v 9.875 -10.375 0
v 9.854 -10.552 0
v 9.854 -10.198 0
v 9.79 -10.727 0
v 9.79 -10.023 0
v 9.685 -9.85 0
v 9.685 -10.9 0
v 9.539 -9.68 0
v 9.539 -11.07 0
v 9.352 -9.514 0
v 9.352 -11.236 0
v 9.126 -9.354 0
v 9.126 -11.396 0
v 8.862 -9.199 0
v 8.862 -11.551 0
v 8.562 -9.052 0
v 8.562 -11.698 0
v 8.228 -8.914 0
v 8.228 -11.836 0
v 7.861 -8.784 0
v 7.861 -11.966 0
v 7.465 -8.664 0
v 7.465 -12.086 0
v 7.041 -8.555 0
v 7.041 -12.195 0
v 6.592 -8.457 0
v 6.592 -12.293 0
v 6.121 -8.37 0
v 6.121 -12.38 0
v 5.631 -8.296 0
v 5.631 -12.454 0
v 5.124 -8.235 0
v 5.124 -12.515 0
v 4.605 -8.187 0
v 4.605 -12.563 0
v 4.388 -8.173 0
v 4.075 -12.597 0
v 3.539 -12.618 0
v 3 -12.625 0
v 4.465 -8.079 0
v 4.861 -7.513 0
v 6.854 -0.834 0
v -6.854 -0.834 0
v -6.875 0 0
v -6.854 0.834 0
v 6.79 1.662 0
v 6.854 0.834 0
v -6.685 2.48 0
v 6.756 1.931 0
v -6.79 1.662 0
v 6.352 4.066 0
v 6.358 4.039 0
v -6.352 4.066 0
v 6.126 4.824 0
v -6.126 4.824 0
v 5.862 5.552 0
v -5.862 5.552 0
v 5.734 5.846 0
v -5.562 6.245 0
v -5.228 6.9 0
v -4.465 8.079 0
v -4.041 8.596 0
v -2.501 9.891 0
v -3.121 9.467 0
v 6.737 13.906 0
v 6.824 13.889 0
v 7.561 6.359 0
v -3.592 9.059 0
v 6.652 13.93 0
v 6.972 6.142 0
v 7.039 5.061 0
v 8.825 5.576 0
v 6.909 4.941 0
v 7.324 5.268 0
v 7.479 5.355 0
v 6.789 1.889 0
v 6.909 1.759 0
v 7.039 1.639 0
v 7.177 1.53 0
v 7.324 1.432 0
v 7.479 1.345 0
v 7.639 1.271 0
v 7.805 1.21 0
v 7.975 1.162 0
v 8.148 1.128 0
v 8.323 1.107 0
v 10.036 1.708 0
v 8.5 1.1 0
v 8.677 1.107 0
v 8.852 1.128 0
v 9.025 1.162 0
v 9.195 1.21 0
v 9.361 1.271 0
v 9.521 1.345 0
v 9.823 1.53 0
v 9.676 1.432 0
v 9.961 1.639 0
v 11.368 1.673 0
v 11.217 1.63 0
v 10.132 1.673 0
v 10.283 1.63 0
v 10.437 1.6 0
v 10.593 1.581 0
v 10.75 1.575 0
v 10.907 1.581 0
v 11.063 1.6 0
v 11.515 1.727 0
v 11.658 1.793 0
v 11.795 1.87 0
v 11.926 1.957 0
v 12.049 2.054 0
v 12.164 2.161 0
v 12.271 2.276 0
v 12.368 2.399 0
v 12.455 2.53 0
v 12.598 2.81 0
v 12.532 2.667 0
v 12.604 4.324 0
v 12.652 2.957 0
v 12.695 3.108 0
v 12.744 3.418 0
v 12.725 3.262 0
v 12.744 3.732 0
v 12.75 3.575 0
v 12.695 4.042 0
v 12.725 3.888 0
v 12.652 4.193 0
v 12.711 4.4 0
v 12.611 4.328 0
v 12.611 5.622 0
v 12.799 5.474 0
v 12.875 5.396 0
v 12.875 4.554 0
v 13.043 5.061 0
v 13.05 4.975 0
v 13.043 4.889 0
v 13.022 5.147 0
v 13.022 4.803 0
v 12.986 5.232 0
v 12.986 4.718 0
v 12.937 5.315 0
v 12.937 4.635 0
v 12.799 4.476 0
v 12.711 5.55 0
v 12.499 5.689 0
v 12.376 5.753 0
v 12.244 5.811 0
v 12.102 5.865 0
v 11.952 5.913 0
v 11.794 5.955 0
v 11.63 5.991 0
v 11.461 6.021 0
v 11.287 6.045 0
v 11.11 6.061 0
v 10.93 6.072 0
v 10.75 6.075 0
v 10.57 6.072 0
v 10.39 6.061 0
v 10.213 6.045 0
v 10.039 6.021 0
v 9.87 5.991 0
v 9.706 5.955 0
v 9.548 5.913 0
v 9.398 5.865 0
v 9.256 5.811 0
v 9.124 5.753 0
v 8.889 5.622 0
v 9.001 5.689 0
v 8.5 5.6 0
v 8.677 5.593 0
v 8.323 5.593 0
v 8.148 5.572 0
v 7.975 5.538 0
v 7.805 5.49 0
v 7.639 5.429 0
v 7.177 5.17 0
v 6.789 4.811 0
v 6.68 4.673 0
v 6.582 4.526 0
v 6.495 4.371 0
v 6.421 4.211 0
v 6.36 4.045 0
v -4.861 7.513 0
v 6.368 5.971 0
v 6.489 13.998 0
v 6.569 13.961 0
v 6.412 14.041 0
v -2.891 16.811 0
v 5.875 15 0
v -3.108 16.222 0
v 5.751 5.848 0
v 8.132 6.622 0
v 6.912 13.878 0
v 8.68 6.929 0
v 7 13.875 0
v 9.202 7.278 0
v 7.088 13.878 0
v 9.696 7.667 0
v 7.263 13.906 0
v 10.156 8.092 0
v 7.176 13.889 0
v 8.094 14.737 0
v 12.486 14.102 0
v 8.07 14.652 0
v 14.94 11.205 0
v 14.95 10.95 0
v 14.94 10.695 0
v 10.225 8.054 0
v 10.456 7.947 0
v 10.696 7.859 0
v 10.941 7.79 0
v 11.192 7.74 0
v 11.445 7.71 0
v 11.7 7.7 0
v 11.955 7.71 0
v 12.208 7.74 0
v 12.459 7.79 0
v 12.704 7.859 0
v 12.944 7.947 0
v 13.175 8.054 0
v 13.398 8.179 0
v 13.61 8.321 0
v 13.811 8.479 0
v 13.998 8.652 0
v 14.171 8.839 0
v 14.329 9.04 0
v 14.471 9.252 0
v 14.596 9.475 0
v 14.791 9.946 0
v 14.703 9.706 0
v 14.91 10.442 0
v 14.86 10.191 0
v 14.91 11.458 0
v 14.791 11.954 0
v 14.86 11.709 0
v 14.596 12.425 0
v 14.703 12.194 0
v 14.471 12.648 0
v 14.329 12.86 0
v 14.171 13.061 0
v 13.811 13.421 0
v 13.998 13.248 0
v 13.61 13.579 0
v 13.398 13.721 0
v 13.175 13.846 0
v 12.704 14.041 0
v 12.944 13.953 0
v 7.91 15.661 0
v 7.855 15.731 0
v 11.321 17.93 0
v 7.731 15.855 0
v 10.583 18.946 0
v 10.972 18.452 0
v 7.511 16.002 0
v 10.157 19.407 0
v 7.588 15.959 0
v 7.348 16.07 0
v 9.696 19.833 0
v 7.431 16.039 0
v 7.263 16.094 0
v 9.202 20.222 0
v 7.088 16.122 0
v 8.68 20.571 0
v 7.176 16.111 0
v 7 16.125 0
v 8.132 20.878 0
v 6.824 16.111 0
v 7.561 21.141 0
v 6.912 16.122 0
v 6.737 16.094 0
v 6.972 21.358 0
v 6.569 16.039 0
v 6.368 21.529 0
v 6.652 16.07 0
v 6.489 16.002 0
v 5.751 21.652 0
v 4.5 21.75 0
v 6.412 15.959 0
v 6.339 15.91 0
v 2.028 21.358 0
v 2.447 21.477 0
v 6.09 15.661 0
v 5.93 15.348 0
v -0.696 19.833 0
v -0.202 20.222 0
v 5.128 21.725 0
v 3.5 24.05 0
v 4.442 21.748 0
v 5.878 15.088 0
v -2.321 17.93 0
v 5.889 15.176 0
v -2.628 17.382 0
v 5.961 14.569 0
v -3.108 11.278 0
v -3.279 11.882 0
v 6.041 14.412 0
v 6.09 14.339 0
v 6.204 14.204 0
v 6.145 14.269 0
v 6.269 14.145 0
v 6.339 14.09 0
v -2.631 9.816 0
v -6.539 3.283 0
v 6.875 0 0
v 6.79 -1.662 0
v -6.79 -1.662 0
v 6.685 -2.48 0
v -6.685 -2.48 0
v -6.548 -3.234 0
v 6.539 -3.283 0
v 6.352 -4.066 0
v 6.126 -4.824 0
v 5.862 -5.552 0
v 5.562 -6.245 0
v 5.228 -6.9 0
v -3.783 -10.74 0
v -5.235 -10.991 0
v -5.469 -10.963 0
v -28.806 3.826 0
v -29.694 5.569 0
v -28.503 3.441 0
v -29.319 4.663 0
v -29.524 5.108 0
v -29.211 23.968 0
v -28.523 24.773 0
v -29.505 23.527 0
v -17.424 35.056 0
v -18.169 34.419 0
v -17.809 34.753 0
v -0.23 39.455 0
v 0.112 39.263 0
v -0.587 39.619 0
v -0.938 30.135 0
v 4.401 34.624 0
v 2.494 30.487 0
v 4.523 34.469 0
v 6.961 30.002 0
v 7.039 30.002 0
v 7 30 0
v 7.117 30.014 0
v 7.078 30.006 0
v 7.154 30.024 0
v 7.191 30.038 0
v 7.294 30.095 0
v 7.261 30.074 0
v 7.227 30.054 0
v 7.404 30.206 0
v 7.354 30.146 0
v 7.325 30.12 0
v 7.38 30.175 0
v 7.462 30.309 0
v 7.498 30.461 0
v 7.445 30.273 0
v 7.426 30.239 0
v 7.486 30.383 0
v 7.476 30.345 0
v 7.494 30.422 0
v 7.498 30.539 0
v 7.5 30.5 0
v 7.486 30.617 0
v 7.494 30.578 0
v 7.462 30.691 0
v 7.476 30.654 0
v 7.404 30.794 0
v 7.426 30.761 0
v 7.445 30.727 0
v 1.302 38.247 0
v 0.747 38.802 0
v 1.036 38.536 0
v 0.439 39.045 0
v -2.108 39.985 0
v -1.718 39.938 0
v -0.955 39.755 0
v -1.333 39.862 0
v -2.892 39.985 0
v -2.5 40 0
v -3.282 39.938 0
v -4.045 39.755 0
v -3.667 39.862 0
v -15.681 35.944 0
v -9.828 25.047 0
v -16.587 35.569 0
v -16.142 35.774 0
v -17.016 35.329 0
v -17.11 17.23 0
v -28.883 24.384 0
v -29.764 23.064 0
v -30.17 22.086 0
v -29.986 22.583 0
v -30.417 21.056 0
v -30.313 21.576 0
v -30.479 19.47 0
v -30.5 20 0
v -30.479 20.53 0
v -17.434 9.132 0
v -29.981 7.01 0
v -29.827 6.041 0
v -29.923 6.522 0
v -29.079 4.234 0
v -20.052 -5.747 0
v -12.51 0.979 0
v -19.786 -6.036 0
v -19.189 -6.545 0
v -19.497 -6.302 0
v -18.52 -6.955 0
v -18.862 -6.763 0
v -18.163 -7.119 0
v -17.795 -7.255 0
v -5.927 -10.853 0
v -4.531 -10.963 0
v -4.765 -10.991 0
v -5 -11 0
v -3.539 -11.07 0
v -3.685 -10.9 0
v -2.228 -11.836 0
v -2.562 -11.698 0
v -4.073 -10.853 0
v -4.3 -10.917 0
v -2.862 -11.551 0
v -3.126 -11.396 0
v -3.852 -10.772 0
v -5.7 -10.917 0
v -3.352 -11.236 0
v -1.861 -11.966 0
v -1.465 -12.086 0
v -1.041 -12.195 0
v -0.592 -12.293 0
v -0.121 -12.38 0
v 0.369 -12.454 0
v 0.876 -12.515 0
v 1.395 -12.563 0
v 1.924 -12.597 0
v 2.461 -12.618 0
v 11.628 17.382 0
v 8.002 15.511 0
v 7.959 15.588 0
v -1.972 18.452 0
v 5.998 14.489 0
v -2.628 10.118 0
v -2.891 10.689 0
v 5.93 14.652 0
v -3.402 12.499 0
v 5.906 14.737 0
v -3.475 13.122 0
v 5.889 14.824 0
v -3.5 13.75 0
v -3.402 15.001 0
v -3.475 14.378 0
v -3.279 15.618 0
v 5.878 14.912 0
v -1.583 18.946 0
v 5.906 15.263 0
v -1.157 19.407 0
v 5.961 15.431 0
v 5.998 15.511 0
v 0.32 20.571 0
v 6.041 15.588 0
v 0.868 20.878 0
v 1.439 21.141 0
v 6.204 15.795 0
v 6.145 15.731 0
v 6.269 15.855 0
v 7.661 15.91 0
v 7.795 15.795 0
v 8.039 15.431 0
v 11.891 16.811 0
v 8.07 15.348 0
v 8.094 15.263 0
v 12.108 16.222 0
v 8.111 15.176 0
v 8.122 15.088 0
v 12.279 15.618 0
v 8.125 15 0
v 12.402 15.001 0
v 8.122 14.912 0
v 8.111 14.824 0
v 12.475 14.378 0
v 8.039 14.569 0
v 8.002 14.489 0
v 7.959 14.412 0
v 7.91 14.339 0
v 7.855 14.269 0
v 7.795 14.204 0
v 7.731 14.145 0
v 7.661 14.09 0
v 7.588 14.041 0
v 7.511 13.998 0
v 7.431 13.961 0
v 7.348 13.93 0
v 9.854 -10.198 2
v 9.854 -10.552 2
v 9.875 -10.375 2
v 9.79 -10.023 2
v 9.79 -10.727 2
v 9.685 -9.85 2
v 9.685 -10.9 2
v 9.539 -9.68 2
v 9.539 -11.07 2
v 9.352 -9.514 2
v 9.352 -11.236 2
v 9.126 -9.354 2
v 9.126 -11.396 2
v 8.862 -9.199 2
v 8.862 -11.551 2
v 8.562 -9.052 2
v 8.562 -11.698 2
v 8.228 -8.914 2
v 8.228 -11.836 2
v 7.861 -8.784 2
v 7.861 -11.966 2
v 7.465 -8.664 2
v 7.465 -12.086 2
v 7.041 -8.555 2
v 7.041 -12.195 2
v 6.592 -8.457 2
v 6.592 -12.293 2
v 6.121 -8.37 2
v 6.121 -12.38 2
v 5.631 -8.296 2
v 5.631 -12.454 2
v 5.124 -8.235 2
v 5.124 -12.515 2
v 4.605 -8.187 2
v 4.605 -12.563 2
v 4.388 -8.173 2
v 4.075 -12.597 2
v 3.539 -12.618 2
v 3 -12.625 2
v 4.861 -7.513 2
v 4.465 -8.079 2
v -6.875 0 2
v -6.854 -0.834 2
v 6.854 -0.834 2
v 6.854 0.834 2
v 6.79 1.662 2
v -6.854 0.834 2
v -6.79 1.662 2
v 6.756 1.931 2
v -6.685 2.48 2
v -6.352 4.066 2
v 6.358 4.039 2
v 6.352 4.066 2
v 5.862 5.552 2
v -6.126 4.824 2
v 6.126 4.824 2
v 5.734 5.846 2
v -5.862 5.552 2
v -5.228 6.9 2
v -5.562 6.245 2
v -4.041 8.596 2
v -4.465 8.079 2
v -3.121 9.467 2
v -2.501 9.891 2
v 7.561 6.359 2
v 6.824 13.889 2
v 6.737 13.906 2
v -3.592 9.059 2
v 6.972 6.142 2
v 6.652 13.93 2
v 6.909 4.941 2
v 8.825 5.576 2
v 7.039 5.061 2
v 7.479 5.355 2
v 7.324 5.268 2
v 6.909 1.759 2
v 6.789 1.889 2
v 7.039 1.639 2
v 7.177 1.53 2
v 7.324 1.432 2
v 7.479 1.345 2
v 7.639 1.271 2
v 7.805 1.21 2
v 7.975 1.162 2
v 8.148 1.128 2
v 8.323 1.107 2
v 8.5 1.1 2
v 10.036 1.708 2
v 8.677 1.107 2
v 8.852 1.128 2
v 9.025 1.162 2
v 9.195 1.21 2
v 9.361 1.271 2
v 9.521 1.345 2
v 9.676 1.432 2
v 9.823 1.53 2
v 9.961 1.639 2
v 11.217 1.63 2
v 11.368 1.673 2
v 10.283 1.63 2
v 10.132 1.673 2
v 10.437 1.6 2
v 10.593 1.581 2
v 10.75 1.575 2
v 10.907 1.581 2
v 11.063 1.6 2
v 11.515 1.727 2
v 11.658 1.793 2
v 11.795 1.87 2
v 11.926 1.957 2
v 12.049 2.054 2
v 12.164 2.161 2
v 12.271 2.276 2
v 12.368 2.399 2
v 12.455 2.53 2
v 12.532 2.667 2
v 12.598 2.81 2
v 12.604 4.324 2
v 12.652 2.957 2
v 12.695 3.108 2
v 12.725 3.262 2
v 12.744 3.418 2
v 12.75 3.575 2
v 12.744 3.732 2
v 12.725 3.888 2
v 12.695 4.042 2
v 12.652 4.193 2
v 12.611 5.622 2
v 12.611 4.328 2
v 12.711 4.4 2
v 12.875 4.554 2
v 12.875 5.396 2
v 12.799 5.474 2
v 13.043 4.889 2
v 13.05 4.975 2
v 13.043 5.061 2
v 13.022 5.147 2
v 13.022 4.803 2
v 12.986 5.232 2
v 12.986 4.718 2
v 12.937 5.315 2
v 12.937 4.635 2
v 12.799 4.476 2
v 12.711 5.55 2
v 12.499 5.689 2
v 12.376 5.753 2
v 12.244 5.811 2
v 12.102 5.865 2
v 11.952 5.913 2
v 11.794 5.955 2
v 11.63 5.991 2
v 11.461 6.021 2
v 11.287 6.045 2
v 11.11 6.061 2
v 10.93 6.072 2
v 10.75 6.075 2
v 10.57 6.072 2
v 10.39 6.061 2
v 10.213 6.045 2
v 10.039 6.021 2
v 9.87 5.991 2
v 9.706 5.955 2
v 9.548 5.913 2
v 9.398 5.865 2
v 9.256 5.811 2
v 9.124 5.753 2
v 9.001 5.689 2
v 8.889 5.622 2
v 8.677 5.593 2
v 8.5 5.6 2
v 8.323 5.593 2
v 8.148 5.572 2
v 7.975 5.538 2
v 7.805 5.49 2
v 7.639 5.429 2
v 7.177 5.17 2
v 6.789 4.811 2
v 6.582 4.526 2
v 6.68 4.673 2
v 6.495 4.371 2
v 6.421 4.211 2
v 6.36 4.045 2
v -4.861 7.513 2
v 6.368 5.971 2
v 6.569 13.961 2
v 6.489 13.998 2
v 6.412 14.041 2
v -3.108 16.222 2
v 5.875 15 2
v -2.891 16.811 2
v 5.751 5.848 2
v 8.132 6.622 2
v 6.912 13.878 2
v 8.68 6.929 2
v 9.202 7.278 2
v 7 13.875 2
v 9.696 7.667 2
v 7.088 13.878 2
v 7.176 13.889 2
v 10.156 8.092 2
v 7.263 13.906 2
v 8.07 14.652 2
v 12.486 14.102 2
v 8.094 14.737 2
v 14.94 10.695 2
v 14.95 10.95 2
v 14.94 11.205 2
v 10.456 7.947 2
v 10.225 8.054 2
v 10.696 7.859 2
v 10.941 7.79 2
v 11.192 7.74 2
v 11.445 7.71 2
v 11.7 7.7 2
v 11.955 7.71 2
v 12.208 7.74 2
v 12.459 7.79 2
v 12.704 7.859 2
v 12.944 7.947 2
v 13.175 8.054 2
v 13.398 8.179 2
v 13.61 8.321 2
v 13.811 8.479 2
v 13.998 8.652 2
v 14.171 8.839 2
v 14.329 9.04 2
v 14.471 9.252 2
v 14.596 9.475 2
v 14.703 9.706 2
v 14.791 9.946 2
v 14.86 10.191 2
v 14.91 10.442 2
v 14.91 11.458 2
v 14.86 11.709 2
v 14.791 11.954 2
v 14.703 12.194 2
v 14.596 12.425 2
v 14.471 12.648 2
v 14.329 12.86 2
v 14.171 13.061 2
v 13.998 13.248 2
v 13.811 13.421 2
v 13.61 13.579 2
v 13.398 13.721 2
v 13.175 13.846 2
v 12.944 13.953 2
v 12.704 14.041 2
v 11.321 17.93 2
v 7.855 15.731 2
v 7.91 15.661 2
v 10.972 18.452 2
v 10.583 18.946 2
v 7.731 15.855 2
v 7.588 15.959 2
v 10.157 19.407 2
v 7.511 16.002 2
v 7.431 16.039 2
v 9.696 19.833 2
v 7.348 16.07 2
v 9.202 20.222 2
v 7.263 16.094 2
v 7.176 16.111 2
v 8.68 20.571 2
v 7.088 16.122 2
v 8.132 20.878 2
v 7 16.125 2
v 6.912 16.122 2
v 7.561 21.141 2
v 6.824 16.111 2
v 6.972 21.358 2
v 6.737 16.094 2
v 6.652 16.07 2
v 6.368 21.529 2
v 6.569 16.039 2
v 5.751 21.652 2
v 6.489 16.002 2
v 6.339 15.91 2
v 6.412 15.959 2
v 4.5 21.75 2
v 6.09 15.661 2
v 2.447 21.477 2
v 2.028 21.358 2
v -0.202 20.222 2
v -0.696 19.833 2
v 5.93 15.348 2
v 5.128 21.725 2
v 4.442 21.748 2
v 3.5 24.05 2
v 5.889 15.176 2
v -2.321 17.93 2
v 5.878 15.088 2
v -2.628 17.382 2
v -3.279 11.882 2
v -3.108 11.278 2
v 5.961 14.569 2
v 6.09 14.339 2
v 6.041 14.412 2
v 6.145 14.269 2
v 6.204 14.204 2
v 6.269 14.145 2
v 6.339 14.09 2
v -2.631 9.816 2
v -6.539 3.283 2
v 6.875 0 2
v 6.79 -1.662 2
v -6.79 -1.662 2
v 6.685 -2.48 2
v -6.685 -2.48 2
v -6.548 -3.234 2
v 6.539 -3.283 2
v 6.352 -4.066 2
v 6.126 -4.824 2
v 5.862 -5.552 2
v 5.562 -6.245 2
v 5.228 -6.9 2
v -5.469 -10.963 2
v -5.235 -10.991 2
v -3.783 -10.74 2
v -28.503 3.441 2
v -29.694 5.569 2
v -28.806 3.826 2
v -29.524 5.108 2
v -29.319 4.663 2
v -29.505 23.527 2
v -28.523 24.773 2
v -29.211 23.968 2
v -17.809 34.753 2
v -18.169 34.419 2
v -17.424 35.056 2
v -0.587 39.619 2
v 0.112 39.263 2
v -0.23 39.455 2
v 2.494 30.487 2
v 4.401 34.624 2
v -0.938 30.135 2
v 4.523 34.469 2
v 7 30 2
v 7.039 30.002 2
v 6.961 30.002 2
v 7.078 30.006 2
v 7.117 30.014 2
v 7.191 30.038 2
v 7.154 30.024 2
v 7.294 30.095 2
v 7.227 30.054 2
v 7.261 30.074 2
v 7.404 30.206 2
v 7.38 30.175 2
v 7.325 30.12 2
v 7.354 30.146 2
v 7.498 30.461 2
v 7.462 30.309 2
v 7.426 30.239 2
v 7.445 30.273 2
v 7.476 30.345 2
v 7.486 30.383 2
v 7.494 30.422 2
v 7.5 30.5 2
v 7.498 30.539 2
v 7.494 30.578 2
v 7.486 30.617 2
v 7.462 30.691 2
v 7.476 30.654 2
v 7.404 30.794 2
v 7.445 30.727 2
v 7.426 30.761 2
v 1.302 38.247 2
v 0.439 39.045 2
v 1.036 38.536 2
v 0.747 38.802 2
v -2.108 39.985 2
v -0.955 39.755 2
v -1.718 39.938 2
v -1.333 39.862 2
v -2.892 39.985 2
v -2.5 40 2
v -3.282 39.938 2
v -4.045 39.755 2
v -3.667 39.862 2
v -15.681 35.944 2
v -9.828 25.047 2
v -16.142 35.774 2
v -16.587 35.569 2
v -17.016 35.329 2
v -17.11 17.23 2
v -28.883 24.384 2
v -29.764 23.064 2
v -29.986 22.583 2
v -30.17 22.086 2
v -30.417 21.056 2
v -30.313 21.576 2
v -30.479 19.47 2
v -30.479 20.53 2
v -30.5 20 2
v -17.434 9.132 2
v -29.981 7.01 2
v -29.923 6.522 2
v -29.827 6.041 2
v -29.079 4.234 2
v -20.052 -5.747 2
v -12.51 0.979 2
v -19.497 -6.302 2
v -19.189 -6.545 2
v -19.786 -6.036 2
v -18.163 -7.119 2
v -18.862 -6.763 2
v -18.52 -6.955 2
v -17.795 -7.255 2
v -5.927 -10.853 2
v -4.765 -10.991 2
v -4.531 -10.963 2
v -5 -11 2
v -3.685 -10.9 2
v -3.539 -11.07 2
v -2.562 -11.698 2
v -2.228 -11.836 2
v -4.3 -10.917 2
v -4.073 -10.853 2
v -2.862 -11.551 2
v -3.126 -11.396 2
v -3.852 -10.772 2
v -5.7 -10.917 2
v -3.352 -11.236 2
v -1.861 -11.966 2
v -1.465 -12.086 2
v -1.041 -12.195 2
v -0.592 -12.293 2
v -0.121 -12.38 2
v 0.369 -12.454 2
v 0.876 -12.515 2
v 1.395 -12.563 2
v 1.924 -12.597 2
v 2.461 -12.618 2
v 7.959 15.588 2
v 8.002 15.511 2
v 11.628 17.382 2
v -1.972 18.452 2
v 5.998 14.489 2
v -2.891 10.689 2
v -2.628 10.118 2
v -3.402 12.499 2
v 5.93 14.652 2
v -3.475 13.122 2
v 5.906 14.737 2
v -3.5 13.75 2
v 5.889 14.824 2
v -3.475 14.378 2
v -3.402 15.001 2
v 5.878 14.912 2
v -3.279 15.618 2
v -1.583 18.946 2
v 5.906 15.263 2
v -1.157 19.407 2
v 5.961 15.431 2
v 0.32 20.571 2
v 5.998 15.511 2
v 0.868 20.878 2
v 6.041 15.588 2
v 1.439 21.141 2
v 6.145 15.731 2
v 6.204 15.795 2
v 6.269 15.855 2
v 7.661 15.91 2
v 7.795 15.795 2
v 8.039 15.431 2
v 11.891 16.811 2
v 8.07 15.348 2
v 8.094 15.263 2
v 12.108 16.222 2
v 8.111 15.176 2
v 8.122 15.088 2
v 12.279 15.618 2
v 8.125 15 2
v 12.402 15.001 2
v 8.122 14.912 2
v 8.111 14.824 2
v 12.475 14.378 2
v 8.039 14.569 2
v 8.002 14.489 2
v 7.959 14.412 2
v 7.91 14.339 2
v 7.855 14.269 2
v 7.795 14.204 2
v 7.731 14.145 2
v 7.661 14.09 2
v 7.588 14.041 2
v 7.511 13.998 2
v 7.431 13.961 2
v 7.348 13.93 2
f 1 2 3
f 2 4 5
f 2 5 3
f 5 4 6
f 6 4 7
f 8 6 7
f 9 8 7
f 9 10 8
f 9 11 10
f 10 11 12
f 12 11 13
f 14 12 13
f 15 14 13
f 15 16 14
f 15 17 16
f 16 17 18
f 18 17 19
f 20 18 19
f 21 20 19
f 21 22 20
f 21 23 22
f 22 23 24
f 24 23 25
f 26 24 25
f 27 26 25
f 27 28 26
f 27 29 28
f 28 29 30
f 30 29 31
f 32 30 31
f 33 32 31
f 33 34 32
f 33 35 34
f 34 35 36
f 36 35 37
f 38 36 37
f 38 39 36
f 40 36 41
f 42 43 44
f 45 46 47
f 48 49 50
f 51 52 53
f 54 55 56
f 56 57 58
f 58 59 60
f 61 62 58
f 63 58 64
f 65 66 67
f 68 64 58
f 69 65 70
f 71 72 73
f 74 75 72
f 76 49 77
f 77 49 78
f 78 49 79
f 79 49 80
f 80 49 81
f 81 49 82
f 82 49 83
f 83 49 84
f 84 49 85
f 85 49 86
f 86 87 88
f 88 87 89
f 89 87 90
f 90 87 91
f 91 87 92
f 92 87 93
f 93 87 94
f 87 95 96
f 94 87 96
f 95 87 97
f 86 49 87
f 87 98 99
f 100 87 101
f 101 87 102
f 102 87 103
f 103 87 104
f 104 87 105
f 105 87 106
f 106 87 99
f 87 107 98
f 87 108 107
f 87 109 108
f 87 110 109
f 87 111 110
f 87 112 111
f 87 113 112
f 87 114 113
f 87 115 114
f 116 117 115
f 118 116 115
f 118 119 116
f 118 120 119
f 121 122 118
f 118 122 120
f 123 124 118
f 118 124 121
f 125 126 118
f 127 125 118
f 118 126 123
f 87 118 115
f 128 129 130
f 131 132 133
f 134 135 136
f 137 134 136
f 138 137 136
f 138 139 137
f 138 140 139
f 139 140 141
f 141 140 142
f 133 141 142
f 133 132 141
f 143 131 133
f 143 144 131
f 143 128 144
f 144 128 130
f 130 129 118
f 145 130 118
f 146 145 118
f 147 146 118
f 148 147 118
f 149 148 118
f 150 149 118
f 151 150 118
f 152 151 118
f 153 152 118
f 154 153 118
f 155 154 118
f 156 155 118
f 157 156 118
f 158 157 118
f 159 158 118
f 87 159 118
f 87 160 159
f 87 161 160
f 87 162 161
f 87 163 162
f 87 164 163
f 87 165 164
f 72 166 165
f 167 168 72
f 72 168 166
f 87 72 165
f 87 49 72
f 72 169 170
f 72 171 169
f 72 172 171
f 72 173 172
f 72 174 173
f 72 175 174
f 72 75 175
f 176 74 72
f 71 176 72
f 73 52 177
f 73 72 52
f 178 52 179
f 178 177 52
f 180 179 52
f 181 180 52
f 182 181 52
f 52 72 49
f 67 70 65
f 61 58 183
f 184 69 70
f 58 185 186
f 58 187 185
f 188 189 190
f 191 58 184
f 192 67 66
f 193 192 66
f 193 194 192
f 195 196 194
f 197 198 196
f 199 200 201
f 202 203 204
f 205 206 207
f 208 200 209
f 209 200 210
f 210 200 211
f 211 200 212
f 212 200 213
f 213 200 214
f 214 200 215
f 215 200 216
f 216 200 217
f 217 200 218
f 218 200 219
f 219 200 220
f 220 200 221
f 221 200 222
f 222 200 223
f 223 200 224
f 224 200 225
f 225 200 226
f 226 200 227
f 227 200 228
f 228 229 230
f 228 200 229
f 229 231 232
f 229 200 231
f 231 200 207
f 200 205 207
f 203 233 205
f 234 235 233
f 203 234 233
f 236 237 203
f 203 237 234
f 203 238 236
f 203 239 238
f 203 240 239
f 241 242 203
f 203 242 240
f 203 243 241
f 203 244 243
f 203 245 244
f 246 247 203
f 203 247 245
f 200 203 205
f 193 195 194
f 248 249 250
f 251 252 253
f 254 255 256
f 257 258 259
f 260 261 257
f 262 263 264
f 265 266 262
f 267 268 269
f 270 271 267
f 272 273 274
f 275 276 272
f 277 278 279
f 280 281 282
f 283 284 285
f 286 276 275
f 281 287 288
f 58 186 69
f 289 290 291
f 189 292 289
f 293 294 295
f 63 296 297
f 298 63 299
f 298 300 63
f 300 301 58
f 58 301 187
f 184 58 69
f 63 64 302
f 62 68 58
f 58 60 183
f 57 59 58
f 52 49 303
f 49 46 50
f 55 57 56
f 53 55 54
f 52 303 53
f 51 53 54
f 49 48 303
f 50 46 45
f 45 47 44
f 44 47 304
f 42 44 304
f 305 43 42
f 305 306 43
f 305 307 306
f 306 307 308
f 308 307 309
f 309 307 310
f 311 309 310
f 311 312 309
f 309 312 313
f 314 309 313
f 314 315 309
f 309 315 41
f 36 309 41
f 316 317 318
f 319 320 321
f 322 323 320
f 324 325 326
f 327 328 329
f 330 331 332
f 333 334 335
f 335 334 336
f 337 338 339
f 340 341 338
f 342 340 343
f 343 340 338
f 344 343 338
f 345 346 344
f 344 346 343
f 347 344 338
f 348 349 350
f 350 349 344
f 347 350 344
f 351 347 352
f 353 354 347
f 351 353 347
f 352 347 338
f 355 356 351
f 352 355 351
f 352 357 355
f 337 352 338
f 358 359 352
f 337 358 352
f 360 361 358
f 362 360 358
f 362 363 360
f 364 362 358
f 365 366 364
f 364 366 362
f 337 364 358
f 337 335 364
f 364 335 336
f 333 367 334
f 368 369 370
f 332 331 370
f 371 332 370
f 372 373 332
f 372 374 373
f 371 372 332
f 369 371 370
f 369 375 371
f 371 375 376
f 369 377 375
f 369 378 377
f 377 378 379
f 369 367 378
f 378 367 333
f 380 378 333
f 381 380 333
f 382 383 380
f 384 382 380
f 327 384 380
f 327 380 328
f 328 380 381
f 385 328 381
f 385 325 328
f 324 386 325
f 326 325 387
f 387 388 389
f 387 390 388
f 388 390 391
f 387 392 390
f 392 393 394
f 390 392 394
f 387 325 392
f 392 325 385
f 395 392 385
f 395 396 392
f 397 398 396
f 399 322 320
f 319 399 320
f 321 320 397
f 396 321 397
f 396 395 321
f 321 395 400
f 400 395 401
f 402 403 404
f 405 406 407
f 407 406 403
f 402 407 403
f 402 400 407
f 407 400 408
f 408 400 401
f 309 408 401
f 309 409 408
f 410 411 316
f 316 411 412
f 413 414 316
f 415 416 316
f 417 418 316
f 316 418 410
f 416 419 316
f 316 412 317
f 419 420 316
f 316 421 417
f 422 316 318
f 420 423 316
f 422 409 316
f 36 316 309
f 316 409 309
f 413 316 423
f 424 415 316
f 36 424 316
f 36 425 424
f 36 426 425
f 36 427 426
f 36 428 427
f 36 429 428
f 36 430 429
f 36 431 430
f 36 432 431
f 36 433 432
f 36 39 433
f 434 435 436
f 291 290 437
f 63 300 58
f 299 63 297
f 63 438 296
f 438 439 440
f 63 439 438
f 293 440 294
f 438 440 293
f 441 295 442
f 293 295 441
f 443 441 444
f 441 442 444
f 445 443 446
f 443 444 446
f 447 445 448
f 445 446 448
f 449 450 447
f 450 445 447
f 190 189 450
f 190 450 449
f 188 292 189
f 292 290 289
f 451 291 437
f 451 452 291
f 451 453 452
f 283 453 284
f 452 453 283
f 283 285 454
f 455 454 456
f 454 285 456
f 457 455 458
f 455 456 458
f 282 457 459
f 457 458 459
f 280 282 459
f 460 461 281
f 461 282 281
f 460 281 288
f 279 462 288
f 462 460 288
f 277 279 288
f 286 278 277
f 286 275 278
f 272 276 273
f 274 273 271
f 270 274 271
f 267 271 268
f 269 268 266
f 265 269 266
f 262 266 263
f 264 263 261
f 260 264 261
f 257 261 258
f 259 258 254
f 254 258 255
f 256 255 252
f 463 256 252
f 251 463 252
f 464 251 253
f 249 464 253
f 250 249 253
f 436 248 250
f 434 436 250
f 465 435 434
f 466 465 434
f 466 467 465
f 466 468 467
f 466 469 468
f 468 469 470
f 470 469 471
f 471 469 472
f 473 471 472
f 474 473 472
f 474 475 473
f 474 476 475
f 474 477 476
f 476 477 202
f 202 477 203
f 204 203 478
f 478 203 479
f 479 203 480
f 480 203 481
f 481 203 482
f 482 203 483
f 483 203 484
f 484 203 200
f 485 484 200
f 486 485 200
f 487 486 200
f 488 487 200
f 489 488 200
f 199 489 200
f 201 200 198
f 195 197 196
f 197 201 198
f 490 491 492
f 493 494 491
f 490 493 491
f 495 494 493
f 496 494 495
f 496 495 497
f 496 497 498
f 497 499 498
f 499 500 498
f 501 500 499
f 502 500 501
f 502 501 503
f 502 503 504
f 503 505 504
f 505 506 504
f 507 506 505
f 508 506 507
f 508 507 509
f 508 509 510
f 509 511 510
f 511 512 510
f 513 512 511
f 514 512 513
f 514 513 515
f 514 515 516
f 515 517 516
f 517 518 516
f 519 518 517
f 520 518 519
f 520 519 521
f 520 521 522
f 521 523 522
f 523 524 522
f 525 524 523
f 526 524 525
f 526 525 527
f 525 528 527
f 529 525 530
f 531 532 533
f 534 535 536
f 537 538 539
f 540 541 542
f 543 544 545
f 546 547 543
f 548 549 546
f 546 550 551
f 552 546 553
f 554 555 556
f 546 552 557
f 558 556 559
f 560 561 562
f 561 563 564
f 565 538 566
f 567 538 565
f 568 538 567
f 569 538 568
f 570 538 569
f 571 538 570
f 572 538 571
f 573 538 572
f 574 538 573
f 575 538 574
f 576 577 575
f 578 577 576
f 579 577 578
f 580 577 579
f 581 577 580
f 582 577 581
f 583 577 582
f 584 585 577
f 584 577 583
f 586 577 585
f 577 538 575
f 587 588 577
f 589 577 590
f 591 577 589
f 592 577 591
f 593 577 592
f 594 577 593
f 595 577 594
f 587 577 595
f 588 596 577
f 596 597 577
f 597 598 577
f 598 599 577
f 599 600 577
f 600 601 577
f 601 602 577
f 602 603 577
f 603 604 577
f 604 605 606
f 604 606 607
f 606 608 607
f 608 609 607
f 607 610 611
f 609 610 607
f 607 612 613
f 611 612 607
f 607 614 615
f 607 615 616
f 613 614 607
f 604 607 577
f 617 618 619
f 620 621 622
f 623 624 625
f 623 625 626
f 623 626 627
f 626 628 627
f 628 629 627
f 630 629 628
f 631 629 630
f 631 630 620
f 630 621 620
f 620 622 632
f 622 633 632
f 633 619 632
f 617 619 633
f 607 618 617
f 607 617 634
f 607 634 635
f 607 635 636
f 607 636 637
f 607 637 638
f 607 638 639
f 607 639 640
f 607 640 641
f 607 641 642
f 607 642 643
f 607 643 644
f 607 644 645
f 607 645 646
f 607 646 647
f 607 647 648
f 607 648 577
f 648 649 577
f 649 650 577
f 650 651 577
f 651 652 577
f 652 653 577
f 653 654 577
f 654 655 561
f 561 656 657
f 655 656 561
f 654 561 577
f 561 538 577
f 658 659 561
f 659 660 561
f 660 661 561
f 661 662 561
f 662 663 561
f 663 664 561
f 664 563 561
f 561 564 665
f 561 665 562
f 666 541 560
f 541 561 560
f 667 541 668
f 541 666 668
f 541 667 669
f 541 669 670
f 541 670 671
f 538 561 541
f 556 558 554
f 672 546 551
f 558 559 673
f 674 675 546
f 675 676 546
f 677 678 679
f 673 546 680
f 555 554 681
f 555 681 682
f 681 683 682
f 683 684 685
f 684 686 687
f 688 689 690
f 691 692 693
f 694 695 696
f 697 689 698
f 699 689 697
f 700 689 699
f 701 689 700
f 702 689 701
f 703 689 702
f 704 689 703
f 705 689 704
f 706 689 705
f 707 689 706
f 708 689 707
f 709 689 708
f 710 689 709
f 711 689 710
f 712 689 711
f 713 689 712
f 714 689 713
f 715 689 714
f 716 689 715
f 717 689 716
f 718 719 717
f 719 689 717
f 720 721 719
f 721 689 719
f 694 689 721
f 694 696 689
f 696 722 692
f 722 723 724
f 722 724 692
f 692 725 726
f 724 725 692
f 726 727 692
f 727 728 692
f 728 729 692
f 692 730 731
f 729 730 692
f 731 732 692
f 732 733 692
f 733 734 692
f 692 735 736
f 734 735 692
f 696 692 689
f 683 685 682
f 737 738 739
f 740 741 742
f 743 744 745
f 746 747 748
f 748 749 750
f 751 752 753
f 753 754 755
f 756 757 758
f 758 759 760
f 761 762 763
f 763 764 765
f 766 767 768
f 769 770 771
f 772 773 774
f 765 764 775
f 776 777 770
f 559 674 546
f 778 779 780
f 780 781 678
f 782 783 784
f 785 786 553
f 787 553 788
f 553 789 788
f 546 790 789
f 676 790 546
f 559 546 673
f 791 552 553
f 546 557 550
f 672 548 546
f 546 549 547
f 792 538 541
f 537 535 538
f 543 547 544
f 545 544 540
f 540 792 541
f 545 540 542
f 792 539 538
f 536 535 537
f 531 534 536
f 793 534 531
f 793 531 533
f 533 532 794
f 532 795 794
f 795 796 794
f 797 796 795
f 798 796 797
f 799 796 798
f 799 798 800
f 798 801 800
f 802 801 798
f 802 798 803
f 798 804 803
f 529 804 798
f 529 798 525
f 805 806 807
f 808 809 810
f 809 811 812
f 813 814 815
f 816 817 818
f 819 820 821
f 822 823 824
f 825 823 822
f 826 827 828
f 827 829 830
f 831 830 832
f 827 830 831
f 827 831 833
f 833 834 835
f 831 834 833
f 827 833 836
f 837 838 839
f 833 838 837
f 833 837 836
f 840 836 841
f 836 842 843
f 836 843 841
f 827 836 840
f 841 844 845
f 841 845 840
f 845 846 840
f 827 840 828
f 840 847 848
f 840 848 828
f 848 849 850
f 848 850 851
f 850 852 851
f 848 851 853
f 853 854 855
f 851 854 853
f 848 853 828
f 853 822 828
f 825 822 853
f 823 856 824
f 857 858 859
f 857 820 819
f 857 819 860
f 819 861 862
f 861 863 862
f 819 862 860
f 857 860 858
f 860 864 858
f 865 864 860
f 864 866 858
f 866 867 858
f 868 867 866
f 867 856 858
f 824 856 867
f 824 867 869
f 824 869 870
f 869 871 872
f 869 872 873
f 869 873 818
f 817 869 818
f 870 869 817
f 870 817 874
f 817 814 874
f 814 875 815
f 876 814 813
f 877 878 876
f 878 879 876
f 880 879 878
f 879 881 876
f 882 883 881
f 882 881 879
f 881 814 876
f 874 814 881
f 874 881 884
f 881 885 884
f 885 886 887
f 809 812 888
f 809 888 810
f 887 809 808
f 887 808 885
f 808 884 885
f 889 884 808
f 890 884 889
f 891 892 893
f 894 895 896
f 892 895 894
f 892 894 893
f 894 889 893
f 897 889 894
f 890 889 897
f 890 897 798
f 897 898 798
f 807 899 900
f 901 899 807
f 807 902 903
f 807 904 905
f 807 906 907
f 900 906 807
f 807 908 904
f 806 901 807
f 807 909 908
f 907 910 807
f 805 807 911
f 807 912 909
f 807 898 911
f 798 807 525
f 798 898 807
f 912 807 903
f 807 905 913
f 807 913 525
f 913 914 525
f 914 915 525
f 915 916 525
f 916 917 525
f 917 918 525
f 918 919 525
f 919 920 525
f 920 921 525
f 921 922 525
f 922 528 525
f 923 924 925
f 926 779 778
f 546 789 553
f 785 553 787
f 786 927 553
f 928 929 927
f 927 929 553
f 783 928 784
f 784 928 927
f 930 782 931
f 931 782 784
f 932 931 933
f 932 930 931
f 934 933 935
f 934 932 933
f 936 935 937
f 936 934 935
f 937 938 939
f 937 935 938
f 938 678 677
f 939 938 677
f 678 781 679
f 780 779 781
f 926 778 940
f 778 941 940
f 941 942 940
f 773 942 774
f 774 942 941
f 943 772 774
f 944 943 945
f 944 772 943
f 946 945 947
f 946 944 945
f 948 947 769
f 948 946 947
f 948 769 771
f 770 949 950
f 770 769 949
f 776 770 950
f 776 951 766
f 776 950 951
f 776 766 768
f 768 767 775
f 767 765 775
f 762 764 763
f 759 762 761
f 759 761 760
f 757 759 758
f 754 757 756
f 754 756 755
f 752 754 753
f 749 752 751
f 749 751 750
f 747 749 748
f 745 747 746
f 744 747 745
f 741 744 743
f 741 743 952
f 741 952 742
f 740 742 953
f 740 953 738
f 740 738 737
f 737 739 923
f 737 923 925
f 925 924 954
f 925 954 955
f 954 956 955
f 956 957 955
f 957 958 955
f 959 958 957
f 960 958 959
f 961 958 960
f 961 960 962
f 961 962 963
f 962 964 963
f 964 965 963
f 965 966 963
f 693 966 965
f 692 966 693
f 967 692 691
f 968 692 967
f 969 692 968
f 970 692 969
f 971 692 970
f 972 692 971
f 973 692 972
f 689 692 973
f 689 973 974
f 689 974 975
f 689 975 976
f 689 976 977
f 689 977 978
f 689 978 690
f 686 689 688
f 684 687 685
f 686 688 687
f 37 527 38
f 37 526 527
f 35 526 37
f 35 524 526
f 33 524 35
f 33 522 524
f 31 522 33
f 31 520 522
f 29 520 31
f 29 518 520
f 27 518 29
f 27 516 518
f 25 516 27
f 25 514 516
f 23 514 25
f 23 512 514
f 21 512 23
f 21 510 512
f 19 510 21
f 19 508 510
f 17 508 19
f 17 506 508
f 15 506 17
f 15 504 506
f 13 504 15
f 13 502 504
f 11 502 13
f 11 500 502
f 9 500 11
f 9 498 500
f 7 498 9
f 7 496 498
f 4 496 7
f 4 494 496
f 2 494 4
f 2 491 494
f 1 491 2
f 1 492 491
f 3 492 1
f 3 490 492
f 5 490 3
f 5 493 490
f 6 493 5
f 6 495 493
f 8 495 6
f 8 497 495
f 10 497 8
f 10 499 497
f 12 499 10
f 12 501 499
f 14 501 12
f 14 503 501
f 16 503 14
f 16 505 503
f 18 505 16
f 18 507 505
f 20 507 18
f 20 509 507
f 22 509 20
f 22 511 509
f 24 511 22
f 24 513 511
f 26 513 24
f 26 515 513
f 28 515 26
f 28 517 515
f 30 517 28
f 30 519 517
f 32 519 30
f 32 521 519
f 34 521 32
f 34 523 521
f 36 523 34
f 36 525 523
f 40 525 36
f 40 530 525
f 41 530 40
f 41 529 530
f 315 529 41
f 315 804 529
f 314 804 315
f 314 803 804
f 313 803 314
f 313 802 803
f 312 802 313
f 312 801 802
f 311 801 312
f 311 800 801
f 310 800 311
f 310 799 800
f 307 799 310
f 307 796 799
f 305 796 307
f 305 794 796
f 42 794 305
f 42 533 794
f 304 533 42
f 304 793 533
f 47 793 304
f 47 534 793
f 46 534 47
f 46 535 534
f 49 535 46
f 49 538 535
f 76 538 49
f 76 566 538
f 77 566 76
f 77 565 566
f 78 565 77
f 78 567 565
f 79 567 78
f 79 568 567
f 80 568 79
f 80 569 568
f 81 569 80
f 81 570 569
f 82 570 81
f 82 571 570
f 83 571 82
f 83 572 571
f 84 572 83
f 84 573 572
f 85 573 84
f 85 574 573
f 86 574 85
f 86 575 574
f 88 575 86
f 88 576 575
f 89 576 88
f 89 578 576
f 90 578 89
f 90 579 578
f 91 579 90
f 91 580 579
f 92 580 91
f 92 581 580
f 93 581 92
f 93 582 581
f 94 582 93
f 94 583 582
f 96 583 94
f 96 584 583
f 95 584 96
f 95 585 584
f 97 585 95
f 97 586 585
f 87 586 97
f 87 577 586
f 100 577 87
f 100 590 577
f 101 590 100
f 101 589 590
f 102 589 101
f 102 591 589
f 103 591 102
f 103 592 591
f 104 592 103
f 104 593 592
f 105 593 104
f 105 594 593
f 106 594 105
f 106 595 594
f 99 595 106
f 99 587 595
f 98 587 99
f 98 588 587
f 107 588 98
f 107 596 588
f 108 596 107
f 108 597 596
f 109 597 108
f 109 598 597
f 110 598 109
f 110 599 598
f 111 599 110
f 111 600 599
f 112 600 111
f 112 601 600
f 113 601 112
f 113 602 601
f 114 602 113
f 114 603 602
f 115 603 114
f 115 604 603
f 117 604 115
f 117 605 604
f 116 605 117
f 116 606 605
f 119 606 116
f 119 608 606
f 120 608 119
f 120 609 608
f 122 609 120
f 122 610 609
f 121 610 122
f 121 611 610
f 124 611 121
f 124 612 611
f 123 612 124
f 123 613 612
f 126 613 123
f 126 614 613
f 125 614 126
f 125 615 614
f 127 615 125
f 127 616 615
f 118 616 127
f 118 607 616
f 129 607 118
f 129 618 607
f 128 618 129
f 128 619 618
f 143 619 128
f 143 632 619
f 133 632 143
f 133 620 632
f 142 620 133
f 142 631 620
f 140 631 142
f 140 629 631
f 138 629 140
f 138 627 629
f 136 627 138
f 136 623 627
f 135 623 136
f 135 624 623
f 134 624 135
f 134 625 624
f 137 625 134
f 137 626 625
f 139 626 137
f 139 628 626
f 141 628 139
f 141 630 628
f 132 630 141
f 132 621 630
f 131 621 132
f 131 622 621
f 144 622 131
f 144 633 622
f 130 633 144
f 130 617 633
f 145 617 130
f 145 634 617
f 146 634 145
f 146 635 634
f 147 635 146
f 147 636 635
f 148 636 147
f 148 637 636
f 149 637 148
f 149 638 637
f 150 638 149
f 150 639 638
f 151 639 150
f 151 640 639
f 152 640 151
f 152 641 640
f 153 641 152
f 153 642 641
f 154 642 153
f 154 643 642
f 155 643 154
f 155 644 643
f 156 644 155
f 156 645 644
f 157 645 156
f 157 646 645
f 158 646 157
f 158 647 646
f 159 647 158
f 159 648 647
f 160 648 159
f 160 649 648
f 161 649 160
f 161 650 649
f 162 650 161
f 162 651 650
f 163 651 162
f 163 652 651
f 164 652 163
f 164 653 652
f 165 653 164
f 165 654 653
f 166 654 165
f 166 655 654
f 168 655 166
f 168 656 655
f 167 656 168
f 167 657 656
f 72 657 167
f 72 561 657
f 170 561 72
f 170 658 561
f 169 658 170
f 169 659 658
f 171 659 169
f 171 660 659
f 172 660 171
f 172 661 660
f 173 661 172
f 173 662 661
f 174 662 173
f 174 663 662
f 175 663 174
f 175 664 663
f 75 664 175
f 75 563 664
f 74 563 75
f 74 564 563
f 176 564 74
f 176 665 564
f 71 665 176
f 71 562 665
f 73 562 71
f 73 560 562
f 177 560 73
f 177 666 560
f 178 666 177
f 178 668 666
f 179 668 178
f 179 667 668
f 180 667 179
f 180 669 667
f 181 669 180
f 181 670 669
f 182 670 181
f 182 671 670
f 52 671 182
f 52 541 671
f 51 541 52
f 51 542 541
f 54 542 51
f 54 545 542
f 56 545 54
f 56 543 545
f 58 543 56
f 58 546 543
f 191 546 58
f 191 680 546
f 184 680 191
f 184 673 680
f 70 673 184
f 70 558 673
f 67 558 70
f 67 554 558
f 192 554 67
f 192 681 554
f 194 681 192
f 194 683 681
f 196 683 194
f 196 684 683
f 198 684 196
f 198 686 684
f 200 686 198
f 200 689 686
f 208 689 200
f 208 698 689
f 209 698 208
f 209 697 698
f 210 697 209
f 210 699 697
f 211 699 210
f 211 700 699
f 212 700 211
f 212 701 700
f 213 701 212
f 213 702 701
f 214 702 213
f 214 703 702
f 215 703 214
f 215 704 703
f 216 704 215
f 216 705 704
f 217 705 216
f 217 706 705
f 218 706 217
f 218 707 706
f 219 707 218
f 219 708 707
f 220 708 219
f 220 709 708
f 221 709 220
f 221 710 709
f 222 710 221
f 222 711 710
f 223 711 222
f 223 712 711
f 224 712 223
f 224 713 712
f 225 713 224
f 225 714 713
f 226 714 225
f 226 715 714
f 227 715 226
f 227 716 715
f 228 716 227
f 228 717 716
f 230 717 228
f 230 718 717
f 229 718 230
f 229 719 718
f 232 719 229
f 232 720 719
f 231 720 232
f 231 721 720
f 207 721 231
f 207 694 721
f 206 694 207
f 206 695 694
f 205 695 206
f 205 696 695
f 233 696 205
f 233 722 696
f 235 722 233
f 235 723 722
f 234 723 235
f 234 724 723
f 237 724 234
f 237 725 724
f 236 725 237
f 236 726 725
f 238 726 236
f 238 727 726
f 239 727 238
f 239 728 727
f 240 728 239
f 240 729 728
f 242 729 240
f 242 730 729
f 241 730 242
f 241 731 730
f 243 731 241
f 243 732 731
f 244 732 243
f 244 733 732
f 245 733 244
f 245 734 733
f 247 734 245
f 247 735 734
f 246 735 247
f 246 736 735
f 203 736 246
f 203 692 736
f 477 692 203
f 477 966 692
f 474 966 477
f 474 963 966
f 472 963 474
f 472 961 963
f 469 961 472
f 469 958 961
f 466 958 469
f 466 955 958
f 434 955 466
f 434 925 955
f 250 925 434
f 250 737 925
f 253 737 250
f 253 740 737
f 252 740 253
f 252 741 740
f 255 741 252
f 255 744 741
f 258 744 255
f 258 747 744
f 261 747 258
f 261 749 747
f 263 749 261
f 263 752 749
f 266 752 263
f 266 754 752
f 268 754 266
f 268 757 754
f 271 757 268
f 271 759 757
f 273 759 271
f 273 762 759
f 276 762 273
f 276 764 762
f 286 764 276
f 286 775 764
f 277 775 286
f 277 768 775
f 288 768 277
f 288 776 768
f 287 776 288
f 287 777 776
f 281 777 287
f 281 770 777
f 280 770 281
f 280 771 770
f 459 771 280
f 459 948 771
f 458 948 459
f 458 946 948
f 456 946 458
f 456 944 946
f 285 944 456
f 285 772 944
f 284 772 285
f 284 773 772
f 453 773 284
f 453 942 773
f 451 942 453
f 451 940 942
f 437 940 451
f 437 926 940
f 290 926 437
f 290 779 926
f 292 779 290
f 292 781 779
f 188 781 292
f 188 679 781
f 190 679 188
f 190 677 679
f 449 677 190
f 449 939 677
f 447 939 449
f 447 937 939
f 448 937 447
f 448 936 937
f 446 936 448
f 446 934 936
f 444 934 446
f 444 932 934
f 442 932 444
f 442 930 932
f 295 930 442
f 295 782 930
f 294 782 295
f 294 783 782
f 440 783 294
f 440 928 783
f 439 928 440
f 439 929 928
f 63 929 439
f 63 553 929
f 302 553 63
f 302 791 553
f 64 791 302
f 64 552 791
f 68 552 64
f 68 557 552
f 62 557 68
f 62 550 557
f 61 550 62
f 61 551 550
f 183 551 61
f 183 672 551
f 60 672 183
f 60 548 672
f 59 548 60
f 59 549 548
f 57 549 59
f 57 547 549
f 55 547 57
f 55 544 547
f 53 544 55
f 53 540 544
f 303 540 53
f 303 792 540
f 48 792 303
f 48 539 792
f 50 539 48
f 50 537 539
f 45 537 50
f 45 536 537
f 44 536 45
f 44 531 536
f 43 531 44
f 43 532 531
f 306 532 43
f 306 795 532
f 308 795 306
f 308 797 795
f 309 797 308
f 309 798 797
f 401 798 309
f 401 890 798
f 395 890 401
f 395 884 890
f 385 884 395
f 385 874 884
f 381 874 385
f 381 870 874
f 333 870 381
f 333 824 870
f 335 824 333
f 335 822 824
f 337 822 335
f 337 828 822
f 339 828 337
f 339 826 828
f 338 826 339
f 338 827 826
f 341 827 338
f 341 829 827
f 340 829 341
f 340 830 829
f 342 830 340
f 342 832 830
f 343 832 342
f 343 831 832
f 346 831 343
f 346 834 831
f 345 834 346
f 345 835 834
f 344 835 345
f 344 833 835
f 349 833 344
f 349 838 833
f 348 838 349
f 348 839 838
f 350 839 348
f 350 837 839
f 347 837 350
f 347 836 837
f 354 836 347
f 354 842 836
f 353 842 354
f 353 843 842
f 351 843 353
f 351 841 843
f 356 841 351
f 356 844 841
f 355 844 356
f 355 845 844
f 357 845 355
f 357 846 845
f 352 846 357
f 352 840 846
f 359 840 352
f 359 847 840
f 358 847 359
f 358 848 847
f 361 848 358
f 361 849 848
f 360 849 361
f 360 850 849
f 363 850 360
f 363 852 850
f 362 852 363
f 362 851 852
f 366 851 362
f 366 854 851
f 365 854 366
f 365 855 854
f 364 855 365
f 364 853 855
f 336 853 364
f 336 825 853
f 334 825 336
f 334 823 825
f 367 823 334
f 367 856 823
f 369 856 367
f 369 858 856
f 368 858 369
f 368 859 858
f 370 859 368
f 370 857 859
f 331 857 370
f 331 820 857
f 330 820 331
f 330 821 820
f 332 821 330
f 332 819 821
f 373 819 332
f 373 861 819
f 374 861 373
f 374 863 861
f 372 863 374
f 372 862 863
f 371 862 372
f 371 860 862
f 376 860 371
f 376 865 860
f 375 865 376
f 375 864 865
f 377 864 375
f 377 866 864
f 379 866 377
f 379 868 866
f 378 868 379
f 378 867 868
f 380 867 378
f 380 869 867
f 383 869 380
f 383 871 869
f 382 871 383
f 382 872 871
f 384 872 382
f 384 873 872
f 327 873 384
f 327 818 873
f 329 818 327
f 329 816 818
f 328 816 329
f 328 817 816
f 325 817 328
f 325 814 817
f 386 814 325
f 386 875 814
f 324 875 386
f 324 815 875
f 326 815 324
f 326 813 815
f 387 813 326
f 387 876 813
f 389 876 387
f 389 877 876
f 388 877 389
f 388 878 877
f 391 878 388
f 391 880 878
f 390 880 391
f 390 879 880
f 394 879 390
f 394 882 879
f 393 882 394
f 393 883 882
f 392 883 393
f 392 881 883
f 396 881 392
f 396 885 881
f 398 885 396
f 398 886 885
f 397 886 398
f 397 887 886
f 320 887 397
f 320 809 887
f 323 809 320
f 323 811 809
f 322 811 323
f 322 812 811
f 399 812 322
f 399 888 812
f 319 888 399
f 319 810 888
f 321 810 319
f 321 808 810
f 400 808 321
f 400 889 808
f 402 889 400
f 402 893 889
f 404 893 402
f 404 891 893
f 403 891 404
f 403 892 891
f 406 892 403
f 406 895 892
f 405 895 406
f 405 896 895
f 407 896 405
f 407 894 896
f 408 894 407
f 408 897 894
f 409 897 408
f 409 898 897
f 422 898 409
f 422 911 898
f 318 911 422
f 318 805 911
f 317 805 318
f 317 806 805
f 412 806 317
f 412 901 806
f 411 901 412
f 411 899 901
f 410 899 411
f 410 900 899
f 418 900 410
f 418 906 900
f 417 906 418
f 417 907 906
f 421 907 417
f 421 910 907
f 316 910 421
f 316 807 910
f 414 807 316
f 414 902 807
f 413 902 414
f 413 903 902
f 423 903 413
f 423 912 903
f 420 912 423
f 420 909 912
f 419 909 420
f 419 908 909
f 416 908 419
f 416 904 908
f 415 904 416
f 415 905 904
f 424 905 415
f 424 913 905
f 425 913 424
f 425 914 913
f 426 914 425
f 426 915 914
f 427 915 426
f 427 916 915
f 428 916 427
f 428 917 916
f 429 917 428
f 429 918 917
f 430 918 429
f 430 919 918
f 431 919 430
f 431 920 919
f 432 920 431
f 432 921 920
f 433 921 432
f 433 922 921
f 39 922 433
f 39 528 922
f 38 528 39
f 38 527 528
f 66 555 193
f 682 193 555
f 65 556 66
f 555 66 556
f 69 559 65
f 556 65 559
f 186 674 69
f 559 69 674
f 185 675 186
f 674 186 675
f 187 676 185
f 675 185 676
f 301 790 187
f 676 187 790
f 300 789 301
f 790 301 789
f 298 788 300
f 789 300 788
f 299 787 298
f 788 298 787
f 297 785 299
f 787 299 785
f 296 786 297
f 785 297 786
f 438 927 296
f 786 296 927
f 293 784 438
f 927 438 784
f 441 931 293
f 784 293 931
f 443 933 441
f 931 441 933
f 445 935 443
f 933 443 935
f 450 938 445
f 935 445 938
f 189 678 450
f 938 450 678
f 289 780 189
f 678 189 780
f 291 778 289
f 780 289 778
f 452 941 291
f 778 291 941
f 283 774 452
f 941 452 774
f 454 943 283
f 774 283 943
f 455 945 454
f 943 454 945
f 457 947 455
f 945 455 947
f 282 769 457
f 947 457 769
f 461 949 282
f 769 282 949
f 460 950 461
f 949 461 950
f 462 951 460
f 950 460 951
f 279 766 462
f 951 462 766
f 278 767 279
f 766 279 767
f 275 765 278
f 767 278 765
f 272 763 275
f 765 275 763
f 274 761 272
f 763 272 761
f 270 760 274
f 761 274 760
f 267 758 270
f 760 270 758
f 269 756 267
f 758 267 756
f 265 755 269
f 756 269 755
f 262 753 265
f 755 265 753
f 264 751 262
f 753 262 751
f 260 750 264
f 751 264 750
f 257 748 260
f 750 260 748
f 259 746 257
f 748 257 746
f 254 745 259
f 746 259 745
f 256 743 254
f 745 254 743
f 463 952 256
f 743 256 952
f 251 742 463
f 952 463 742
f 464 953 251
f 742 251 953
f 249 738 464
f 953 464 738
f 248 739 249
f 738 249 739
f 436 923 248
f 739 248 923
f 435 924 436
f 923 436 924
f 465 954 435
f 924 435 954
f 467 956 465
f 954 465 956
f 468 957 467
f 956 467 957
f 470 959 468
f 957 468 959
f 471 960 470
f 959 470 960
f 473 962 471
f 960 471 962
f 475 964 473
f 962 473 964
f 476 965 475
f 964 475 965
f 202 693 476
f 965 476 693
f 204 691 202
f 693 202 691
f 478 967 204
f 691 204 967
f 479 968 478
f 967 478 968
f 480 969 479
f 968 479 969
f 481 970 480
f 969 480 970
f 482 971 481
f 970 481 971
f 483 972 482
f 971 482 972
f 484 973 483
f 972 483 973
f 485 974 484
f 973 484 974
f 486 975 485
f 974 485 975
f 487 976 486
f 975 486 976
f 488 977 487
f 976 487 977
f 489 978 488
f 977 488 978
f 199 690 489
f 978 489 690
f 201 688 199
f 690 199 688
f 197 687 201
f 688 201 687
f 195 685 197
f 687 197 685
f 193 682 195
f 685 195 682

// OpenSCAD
// file: lib/scale_overlay.scad
module scale_overlay(length = 100, major_step = 10, tick_height = 2, tick_width = 0.8, base_height = 0.4) {
    color([0.1, 0.1, 0.1])
        cube([length, tick_width, base_height]);

    for (x = [0:major_step:length]) {
        color([0.1, 0.1, 0.1])
            translate([x, 0, 0])
                cube([tick_width, tick_width, tick_height]);
    }
}
// main file
// Minimal flat 2D side-profile squirrel silhouette with face cutout.

include <lib/scale_overlay.scad>;

$fn = 80;

size = 25;
thickness = 2;
show_scale = false;

module squirrel_silhouette(size = 25) {
    body_w   = size * 0.55;
    body_h   = size * 0.85;

    head_r   = size * 0.32;
    head_cx  = size * 0.18;
    head_cy  = size * 0.55;

    snout_r  = size * 0.13;
    snout_cx = head_cx + head_r * 0.90;
    snout_cy = head_cy - head_r * 0.35;

    ear_w    = size * 0.18;
    ear_h    = size * 0.22;
    ear_cx   = head_cx - size * 0.04;
    ear_cy   = head_cy + head_r * 0.60;

    foot_w   = size * 0.55;
    foot_h   = size * 0.18;
    foot_cx  = size * 0.12;
    foot_cy  = -body_h / 2 + size * 0.01;

    paw_r    = size * 0.09;
    paw_cx   = head_cx + head_r * 0.50;
    paw_cy   = head_cy - head_r * 1.30;

    acorn_r  = size * 0.08;
    acorn_cx = paw_cx + paw_r * 1.00;
    acorn_cy = paw_cy + paw_r * 0.10;

    // Tail — chain of circles hulled together along a curl
    // Each row: [x, y, radius]
    tail_pts = [
        [-size * 0.20, -size * 0.32, size * 0.12],
        [-size * 0.65, -size * 0.10, size * 0.20],
        [-size * 0.95,  size * 0.30, size * 0.25],
        [-size * 0.95,  size * 0.80, size * 0.27],
        [-size * 0.55,  size * 1.20, size * 0.25],
        [-size * 0.10,  size * 1.40, size * 0.20],
        [ size * 0.10,  size * 1.32, size * 0.10],
        [ size * 0.28,  size * 1.22, size * 0.02],
    ];

    union() {
        // Body
        scale([body_w / size, body_h / size])
            circle(r = size / 2);

        // Head
        translate([head_cx, head_cy])
            circle(r = head_r);

        // Snout
        translate([snout_cx, snout_cy])
            circle(r = snout_r);

        // Ear
        translate([ear_cx, ear_cy])
            polygon(points = [
                [-ear_w / 2, 0],
                [ ear_w / 2, 0],
                [ 0,         ear_h],
            ]);

        // Hind foot
        translate([foot_cx, foot_cy])
            scale([foot_w / size, foot_h / size])
                circle(r = size / 2);

        // Front paw
        translate([paw_cx, paw_cy])
            circle(r = paw_r);

        // Acorn body
        translate([acorn_cx, acorn_cy])
            circle(r = acorn_r);
        // Acorn cap
        translate([acorn_cx, acorn_cy + acorn_r * 0.7])
            scale([1.15, 0.55])
                circle(r = acorn_r);

        // Tail — hulled segments
        for (i = [0 : len(tail_pts) - 2])
            hull() {
                translate([tail_pts[i][0],     tail_pts[i][1]])
                    circle(r = tail_pts[i][2]);
                translate([tail_pts[i + 1][0], tail_pts[i + 1][1]])
                    circle(r = tail_pts[i + 1][2]);
            }
    }
}

module squirrel_face_cutouts(size = 25) {
    head_cx = size * 0.18;
    head_cy = size * 0.55;

    // Eye
    translate([head_cx + size * 0.10, head_cy + size * 0.05])
        circle(r = size * 0.045);
}

module squirrel_model(
    size = 25,
    thickness = 2
) {
    linear_extrude(height = thickness)
        difference() {
            squirrel_silhouette(size = size);
            squirrel_face_cutouts(size = size);
        }
}

squirrel_model(
    size = size,
    thickness = thickness
);

if (show_scale) {
    translate([-size, -size * 1.3, 0])
        scale_overlay(length = 100, major_step = 10);
}
